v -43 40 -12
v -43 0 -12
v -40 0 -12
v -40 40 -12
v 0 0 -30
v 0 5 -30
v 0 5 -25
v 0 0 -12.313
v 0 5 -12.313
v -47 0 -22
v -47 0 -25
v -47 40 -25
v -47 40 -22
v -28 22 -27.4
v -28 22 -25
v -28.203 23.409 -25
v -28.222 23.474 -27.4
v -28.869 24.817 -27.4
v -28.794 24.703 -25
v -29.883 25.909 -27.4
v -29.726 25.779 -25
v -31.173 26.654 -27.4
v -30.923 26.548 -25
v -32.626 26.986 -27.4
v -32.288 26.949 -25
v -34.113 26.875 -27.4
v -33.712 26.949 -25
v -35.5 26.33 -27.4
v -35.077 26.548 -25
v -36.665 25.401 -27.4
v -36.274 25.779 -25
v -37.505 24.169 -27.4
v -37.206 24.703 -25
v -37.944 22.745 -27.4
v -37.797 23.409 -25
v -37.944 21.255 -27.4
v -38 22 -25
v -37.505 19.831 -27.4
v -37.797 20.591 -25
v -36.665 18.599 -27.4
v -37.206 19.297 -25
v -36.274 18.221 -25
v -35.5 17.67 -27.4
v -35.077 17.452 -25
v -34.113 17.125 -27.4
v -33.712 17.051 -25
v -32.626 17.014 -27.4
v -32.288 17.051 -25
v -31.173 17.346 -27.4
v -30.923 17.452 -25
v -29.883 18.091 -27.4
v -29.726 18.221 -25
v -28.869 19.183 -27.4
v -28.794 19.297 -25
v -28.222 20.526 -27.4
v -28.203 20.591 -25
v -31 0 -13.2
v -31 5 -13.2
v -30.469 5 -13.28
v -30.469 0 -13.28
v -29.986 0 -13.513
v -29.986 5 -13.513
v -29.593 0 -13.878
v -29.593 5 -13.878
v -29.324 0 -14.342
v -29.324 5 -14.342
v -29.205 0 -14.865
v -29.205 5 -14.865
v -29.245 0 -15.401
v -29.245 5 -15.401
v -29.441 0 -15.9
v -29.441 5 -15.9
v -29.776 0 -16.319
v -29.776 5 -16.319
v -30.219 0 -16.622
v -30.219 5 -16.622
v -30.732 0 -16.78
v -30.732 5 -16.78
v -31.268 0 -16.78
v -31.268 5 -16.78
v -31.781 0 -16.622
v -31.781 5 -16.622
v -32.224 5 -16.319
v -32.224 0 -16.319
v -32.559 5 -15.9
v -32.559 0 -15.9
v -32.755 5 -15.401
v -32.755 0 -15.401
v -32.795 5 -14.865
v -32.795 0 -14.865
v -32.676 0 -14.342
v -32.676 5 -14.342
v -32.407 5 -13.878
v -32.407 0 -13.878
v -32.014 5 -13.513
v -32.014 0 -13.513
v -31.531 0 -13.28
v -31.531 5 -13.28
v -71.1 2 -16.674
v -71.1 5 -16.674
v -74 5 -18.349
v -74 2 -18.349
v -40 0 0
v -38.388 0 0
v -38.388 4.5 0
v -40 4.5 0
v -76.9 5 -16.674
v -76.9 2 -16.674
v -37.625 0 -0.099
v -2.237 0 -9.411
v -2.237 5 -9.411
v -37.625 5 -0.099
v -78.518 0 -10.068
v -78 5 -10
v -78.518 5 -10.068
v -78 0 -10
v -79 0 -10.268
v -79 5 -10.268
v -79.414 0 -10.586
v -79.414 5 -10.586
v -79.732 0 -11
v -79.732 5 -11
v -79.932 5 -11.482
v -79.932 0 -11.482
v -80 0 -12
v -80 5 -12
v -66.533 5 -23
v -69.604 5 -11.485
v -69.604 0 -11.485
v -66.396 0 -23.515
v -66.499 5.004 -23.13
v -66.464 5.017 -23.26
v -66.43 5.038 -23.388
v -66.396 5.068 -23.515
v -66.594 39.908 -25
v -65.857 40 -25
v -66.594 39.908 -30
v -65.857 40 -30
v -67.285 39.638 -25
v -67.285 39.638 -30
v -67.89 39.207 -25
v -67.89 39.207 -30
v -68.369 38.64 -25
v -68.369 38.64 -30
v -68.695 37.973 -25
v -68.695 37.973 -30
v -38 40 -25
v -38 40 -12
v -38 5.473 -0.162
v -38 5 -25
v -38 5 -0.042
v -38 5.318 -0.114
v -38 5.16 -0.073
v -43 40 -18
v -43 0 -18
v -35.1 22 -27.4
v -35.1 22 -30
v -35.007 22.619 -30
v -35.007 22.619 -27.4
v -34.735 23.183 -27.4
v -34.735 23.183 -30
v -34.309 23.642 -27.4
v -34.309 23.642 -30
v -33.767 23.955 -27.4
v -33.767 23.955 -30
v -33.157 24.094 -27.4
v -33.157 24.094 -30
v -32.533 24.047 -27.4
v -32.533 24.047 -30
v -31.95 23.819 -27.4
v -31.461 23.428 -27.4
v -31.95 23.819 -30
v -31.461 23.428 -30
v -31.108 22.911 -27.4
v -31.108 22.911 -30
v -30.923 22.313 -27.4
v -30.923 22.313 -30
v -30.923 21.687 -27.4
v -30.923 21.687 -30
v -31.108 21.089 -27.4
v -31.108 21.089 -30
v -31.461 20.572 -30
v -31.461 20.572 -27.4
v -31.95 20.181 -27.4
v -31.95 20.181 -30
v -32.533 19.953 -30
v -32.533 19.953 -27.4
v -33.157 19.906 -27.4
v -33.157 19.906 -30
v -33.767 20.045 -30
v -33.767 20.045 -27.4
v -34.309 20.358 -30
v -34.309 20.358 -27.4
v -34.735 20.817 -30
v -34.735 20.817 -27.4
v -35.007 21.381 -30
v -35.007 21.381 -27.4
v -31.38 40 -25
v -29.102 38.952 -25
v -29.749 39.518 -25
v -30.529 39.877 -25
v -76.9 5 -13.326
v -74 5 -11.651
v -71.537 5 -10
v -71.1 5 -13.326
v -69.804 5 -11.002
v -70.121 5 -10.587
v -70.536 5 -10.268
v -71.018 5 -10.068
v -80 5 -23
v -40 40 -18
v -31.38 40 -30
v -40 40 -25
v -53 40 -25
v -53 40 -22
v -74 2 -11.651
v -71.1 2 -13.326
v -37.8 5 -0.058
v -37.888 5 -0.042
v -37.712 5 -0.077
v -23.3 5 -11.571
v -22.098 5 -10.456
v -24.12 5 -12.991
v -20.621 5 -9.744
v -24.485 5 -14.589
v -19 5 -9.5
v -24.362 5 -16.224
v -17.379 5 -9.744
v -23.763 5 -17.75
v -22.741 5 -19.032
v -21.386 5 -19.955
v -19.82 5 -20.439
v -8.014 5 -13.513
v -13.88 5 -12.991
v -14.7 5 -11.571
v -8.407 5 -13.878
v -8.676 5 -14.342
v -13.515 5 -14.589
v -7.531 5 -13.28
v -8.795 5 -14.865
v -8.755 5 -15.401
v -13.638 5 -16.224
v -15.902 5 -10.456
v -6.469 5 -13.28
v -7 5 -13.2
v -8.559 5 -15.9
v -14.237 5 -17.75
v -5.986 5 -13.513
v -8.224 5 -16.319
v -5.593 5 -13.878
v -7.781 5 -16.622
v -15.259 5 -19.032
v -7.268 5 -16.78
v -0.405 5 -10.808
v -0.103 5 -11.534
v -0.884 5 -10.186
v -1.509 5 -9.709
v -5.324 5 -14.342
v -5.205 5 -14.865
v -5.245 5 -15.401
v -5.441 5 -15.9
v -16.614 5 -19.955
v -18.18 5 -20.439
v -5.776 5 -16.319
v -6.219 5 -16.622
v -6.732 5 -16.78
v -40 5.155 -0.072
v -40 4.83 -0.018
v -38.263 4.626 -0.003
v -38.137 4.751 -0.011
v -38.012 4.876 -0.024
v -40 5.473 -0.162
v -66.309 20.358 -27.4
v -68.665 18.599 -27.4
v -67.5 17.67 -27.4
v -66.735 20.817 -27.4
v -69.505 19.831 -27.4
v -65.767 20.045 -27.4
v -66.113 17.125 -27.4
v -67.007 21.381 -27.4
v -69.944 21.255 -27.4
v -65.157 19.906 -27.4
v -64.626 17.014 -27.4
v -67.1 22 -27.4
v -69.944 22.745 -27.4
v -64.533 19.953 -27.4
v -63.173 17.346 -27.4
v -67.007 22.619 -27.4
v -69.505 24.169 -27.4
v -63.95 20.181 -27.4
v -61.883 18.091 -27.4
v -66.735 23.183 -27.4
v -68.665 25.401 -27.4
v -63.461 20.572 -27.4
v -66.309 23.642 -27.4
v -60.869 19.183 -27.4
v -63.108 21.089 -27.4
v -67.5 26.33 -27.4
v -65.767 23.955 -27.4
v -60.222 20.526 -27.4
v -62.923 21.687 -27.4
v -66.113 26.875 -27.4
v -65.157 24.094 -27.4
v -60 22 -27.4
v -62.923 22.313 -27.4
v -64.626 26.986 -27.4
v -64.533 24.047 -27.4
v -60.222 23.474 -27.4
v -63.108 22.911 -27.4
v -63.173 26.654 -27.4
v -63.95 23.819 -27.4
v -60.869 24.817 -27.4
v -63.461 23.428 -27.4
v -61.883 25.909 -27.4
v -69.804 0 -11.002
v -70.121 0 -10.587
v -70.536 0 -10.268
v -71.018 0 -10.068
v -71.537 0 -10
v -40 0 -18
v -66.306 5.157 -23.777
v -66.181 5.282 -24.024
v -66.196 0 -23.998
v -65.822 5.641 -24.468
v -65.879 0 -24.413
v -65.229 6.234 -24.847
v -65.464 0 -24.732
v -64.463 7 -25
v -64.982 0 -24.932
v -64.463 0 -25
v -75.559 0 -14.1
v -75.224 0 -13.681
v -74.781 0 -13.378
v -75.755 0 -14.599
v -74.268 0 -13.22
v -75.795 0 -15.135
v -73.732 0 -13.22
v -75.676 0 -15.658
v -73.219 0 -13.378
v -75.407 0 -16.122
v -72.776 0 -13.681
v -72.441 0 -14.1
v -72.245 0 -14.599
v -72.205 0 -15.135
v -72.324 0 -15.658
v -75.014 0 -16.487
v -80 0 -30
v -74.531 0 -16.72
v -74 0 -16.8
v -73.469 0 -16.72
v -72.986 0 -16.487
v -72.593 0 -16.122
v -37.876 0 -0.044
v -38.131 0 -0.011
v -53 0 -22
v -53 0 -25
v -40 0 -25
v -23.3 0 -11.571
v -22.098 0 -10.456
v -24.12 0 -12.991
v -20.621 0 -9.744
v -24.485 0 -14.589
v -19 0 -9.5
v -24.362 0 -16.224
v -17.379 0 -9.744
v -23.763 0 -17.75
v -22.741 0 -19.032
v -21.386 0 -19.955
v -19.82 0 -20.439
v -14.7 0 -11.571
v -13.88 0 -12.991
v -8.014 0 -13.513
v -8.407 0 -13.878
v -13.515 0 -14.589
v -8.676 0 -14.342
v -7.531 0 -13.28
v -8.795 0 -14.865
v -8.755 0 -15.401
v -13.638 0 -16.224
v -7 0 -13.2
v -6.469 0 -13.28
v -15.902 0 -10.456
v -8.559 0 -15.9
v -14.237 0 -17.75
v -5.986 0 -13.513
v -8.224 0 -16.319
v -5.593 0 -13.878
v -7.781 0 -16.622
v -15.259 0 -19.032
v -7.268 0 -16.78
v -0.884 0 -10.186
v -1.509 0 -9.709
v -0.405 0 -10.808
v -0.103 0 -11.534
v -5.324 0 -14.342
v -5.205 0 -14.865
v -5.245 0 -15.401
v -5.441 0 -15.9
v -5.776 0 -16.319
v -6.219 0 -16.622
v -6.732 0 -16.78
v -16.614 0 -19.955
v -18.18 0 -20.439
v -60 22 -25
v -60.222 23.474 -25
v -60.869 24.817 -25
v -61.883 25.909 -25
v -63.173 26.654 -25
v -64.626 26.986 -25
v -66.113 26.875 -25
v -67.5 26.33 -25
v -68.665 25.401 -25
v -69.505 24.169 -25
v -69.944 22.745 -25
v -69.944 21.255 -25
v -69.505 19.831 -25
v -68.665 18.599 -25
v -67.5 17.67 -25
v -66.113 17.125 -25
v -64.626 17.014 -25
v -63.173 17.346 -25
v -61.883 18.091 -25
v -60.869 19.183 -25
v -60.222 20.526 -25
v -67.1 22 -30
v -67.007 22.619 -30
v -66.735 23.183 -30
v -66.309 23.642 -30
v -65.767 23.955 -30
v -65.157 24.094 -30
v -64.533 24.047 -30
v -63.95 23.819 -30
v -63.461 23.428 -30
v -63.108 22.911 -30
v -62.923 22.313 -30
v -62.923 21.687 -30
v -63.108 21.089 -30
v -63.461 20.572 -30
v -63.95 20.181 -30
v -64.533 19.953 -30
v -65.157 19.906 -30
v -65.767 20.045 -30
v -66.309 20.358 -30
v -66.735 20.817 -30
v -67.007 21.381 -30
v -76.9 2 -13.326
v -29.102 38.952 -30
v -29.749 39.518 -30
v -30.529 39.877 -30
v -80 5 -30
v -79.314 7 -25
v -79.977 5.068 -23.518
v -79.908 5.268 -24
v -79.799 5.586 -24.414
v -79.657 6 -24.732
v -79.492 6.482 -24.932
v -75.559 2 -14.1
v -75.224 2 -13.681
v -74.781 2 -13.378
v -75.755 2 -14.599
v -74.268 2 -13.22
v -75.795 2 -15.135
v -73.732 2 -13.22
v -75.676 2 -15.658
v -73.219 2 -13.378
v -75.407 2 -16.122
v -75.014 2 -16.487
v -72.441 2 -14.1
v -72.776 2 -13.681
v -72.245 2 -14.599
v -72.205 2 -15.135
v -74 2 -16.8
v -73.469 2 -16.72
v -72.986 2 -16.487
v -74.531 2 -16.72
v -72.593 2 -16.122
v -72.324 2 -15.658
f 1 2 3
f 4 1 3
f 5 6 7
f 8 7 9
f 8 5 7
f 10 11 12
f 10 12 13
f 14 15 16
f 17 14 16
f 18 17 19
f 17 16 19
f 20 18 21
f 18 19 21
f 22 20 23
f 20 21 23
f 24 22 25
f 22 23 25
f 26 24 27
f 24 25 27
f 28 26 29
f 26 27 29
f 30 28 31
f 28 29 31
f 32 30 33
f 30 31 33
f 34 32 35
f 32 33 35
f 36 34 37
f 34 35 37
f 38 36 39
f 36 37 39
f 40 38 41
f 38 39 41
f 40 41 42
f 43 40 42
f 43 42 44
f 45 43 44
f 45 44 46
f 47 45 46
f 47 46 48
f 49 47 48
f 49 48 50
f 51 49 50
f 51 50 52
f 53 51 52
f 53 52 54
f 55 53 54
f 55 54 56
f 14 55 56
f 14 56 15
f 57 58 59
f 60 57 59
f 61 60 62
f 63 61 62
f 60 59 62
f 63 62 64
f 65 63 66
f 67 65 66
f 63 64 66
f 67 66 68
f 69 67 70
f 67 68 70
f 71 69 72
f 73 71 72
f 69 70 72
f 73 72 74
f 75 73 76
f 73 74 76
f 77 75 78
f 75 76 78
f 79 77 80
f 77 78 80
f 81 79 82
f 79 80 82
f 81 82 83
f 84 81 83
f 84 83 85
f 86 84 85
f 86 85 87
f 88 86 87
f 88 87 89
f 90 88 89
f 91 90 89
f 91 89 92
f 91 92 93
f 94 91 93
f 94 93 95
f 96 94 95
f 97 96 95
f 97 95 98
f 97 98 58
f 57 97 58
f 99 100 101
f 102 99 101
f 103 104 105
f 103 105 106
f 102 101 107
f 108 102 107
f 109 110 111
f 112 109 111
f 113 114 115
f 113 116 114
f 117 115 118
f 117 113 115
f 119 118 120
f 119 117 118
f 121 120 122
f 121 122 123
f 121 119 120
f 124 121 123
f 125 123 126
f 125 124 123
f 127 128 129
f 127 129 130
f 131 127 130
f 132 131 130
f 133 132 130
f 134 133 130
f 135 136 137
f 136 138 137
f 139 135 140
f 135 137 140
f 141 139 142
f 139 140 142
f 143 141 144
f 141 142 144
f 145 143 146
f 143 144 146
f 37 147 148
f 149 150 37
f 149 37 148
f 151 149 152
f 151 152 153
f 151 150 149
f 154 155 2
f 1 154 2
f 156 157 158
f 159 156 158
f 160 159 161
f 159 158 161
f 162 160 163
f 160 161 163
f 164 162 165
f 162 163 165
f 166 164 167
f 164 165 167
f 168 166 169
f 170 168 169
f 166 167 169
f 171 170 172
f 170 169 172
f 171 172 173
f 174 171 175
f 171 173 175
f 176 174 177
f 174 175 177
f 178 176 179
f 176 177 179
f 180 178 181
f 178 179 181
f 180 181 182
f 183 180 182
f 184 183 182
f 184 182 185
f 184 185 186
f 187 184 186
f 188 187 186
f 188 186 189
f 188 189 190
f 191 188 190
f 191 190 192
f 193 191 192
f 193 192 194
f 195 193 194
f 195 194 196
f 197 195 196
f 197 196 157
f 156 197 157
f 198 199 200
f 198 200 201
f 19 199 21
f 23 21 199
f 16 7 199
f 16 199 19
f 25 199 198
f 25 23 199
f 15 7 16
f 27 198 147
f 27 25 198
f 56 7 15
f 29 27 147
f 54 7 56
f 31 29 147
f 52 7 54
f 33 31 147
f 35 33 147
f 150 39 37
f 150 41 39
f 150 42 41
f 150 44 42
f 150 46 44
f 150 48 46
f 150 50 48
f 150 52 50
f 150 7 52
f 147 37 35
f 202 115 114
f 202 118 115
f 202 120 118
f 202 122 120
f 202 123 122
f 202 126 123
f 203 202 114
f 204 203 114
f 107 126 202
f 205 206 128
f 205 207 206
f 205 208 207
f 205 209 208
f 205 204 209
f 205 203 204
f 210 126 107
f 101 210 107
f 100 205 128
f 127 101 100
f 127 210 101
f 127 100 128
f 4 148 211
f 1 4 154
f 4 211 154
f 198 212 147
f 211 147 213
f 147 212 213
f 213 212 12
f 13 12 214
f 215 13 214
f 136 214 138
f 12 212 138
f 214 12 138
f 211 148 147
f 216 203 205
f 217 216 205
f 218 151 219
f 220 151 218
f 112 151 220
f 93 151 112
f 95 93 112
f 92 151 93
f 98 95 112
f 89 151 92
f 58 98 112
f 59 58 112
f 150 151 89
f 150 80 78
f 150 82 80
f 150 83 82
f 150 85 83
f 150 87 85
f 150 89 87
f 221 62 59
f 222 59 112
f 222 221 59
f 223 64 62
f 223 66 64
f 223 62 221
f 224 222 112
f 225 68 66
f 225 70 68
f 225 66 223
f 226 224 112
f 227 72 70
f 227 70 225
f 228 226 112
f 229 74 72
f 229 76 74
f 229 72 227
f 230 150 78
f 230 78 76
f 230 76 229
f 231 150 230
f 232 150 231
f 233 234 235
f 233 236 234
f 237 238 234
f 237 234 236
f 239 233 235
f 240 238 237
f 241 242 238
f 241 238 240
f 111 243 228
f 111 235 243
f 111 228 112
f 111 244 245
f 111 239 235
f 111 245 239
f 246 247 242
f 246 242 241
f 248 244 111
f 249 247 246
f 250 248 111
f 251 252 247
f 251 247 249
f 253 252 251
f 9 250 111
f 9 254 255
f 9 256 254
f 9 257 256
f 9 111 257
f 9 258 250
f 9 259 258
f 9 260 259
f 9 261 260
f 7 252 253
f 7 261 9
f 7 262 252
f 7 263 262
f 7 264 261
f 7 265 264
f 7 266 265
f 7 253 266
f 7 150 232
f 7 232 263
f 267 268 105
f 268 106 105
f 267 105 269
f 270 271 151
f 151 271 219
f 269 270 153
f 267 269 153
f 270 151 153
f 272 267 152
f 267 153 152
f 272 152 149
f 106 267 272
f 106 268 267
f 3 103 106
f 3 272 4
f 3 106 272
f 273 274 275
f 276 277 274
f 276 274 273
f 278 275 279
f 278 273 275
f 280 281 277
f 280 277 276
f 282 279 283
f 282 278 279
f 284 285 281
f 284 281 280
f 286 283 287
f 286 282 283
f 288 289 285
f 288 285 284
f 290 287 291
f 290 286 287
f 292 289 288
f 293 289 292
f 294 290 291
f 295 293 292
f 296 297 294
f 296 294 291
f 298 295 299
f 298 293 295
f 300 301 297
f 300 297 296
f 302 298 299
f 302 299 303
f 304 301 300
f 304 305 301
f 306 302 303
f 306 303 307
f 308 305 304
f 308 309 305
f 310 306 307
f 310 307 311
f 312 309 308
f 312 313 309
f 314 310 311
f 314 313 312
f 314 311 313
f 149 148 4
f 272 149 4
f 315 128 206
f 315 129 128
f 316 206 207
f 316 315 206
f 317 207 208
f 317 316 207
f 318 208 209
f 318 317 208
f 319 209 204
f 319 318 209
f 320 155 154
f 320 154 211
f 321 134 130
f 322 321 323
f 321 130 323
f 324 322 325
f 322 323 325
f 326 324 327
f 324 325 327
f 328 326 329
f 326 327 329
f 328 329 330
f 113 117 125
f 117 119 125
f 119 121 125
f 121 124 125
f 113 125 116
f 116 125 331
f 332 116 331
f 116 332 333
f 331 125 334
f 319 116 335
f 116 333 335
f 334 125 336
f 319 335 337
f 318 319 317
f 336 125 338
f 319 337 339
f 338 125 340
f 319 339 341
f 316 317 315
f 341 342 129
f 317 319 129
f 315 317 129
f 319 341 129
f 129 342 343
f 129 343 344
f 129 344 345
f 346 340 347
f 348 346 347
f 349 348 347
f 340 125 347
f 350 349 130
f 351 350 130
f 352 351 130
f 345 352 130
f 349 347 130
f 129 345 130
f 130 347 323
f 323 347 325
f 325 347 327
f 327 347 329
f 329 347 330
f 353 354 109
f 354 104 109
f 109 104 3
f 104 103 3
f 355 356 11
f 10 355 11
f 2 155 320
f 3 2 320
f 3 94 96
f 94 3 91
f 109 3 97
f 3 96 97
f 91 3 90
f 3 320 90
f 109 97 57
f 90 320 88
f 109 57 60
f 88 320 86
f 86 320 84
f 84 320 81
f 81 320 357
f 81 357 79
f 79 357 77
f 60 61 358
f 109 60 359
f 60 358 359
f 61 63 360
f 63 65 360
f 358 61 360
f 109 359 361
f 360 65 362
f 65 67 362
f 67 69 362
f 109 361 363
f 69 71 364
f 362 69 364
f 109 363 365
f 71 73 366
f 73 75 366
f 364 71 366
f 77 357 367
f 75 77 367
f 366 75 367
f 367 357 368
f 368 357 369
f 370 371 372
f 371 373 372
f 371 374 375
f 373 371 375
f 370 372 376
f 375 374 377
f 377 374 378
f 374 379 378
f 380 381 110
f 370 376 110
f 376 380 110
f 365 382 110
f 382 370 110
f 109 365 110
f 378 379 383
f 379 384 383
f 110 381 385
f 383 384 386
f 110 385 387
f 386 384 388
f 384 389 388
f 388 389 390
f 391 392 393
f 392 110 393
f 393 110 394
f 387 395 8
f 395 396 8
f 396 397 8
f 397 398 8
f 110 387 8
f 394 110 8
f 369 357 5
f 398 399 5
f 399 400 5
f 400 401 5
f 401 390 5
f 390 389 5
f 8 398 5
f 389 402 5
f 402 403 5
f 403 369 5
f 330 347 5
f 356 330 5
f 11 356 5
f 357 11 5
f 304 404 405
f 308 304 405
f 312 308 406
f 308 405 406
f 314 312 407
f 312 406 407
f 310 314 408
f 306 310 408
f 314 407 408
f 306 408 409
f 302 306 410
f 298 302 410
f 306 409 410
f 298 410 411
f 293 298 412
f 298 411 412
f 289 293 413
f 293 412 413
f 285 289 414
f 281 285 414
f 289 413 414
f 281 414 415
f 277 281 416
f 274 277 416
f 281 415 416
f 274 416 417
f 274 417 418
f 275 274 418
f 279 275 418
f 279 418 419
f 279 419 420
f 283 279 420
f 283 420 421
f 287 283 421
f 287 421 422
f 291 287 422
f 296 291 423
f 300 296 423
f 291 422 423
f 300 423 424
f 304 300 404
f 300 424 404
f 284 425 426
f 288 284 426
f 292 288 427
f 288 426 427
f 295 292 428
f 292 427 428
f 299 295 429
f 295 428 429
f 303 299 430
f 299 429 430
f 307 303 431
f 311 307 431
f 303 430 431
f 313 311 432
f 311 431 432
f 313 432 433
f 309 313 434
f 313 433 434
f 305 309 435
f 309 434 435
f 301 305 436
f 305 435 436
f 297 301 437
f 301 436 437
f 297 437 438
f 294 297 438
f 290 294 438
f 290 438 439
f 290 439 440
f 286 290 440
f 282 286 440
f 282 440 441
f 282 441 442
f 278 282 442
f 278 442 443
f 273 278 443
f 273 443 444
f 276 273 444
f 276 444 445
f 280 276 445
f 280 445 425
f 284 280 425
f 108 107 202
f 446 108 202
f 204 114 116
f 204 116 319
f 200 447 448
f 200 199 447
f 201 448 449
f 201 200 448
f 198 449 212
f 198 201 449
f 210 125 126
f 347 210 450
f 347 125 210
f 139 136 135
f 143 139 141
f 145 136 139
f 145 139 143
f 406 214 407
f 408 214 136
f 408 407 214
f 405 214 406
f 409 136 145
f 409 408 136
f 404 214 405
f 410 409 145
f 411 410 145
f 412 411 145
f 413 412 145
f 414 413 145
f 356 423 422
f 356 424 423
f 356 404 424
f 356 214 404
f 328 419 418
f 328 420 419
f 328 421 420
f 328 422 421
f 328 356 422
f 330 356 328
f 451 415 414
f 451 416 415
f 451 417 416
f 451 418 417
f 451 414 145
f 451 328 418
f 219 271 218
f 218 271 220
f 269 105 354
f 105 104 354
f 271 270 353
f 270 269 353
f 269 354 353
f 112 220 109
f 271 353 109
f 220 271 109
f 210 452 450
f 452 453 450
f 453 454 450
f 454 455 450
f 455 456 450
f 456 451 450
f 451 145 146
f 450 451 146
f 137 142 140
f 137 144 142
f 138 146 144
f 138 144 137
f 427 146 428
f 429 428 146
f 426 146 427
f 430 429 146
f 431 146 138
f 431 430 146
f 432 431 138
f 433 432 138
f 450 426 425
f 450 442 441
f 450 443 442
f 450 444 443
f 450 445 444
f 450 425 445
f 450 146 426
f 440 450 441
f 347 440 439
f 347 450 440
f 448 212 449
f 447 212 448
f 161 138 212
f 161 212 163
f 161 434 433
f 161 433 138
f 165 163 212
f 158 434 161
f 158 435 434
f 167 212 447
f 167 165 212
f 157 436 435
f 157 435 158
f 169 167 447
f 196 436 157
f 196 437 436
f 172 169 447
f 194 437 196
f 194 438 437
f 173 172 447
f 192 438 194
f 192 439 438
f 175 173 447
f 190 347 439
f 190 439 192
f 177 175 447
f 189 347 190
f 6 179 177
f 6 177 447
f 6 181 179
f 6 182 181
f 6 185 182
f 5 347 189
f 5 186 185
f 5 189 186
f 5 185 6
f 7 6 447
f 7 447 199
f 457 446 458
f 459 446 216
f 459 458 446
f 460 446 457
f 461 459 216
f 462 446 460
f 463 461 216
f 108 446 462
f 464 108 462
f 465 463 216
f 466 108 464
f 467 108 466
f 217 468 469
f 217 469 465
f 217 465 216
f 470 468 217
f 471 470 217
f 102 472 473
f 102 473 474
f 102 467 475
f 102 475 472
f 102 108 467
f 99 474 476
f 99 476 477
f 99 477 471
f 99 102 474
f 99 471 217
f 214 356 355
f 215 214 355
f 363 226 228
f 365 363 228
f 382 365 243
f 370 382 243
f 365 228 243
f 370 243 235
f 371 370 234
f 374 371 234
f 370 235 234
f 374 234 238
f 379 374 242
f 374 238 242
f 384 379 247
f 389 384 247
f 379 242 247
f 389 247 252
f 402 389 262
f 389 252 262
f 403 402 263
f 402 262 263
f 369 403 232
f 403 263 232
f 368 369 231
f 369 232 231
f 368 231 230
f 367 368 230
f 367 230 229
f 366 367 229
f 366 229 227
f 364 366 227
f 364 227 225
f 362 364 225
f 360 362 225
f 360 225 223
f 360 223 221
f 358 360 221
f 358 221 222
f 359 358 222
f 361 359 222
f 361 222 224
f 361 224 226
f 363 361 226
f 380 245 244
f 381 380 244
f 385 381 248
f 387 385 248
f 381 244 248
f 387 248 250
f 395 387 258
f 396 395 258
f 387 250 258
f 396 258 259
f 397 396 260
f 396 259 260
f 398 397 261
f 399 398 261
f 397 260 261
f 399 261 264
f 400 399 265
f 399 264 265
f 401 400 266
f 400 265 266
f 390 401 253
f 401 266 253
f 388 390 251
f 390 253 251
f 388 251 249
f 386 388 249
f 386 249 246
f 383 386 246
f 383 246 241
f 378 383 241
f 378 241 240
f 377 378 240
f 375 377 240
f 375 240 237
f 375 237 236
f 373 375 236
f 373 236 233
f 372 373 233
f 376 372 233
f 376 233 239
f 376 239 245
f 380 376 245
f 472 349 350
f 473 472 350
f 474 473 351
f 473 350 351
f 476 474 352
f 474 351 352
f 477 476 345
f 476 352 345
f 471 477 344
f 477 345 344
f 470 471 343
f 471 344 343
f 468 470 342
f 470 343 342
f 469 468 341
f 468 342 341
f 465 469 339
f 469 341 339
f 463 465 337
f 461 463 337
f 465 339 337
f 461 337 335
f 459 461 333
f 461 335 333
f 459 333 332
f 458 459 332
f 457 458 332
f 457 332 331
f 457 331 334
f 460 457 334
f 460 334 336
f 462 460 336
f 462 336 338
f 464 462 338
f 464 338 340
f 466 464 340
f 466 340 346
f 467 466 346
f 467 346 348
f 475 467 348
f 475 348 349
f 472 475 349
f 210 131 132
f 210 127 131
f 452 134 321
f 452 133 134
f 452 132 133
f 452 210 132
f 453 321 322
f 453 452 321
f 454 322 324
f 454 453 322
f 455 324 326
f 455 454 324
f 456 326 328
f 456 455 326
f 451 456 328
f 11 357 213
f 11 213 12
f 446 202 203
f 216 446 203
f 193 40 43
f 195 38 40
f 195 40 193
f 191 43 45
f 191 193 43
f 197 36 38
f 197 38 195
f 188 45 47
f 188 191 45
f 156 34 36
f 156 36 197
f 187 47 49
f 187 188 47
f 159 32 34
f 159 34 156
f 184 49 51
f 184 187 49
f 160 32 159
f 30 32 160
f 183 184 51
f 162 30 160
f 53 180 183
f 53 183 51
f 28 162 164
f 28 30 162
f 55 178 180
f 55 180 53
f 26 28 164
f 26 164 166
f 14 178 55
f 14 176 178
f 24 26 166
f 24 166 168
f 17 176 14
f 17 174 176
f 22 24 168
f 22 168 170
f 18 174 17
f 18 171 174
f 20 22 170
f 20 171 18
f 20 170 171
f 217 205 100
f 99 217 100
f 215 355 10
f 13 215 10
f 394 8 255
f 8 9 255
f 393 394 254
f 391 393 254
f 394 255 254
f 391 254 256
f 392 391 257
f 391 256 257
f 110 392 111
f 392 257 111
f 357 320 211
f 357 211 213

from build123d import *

# Parameters (mm, degrees)
SKETCH1_W           = 80
SKETCH1_H           = 30
BOSS_EXTRUDE1_DEPTH = 5
SKETCH2_W           = 20
SKETCH2_H           = 25
CUT_EXTRUDE1_DEPTH  = 86.586213843
BOSS_EXTRUDE2_DEPTH = 35
SKETCH4_R           = 5.5
SKETCH4_R_2         = 1.8
CUT_EXTRUDE2_DEPTH  = 93.330926563
CHAMFER1_SIZE       = 38
CHAMFER1_SIZE2      = 10
FILLET1_R           = 3
SKETCH5_R           = 2.1
CUT_EXTRUDE3_DEPTH  = 95.339811321
SKETCH6_R           = 5
CUT_EXTRUDE4_DEPTH  = 2.4
CHAMFER2_SIZE       = 35
CHAMFER2_SIZE2      = 30
FILLET2_R           = 3
SKETCH7_W           = 6
SKETCH7_H           = 3
SKETCH7_W_2         = 3
SKETCH7_H_2         = 6
BOSS_EXTRUDE3_DEPTH = 40
CHAMFER3_SIZE       = 35
CHAMFER3_SIZE2      = 12
FILLET3_R           = 3
CHAMFER4_SIZE       = 35
CHAMFER4_SIZE2      = 12
FILLET4_R           = 3
SKETCH8_R           = 1.8
CUT_EXTRUDE5_DEPTH  = 95.339811321
CUT_EXTRUDE6_DEPTH  = 93.330926563
FILLET5_R           = 2
CUT_EXTRUDE7_DEPTH  = 3


with BuildPart() as part:
    # Sketch1 → Boss-Extrude1 (new body)
    with BuildSketch(Plane(origin=(0, 0, 0), x_dir=(1, 0, 0), z_dir=(0, 1, 0))):
        with Locations((-40, 15)):
            Rectangle(SKETCH1_W, SKETCH1_H)
    extrude(amount=BOSS_EXTRUDE1_DEPTH)

    # Sketch2 → Cut-Extrude1 (cut, through all)
    with BuildSketch(Plane(origin=(0, 5, 0), x_dir=(1, 0, 0), z_dir=(0, 1, 0))):
        with Locations((-50, 12.5)):
            Rectangle(SKETCH2_W, SKETCH2_H)
    extrude(amount=-CUT_EXTRUDE1_DEPTH, mode=Mode.SUBTRACT)

    # Sketch3 → Boss-Extrude2 (add)
    with BuildSketch(Plane(origin=(0, 5, 0), x_dir=(1, 0, 0), z_dir=(0, 1, 0))):
        Polygon((-80, 30), (0, 30), (0, 25), (-38, 25), (-38, 0), (-40, 0), (-40, 25), (-80, 25), align=None)
    extrude(amount=BOSS_EXTRUDE2_DEPTH)

    # Sketch4 → Cut-Extrude2 (cut, through all)
    with BuildSketch(Plane(origin=(0, 5, 0), x_dir=(1, 0, 0), z_dir=(0, 1, 0))):
        with Locations(Location((-19, 15, 0), (0, 0, 270))):
            Circle(SKETCH4_R)
        with Locations(Location((-7, 15, 0), (0, 0, 270))):
            Circle(SKETCH4_R_2)
        with Locations(Location((-31, 15, 0), (0, 0, 270))):
            Circle(SKETCH4_R_2)
    extrude(amount=-CUT_EXTRUDE2_DEPTH, mode=Mode.SUBTRACT)

    # Chamfer1
    chamfer1_edges = [part.edges().sort_by_distance(p)[0] for p in [
        (0, 2.5, 0),
    ]]
    chamfer1_side = [part.faces().sort_by_distance(p)[0] for p in [
        (-20, 0.565685425, 0),
    ]]
    chamfer(chamfer1_edges, length=CHAMFER1_SIZE, length2=CHAMFER1_SIZE2, reference=chamfer1_side[0])

    # Fillet1
    fillet1_edges = [part.edges().sort_by_distance(p)[0] for p in [
        (0, 2.5, -10),
    ]]
    fillet(fillet1_edges, radius=FILLET1_R)

    # Sketch5 → Cut-Extrude3 (cut, through all)
    with BuildSketch(Plane(origin=(0, 0, -30), x_dir=(-1, 0, 0), z_dir=(0, 0, -1))):
        with Locations((33, 22)):
            Circle(SKETCH5_R)
        with Locations((65, 22)):
            Circle(SKETCH5_R)
    extrude(amount=-CUT_EXTRUDE3_DEPTH, mode=Mode.SUBTRACT)

    # Sketch6 → Cut-Extrude4 (cut)
    with BuildSketch(Plane.XY.offset(-25)):
        with Locations((-33, 22)):
            Circle(SKETCH6_R)
        with Locations((-65, 22)):
            Circle(SKETCH6_R)
    extrude(amount=-CUT_EXTRUDE4_DEPTH, mode=Mode.SUBTRACT)

    # Chamfer2
    chamfer2_edges = [part.edges().sort_by_distance(p)[0] for p in [
        (0, 40, -27.5),
    ]]
    chamfer2_side = [part.faces().sort_by_distance(p)[0] for p in [
        (0, 15.78592553, -25.370407315),
    ]]
    chamfer(chamfer2_edges, length=CHAMFER2_SIZE, length2=CHAMFER2_SIZE2, reference=chamfer2_side[0])

    # Fillet2
    fillet2_edges = [part.edges().sort_by_distance(p)[0] for p in [
        (-30, 40, -27.5),
    ]]
    fillet(fillet2_edges, radius=FILLET2_R)

    # Sketch7 → Boss-Extrude3 (add)
    with BuildSketch(Plane.XZ):
        with Locations((-50, -23.5)):
            Rectangle(SKETCH7_W, SKETCH7_H)
        with Locations((-41.5, -15)):
            Rectangle(SKETCH7_W_2, SKETCH7_H_2)
    extrude(amount=-BOSS_EXTRUDE3_DEPTH)

    # Chamfer3
    chamfer3_edges = [part.edges().sort_by_distance(p)[0] for p in [
        (-39, 40, 0),
    ]]
    chamfer3_side = [part.faces().sort_by_distance(p)[0] for p in [
        (-39, 20, 0),
    ]]
    chamfer(chamfer3_edges, length=CHAMFER3_SIZE, length2=CHAMFER3_SIZE2, reference=chamfer3_side[0])

    # Fillet3
    # the kernel refuses this fillet: 3 mm, written as the material it takes off along each edge
    with BuildSketch(Plane(origin=(-36.75, 5, 0), x_dir=(0, 0.945945945945946, -0.3243243243243238), z_dir=(-1, 0, 0))) as fillet3_piece_1:
        with BuildLine():
            CenterArc((FILLET3_R * 0.166666666667, FILLET3_R), FILLET3_R, 251.075355584, 18.924644416)
            Line((-FILLET3_R * 0.157657657658, FILLET3_R * 0.0540540540541), (0, 0))
            Line((0, 0), (FILLET3_R * 0.166666666667, 0))
        make_face()
    extrude(amount=4.5, mode=Mode.SUBTRACT)
    with BuildSketch(Plane(origin=(-38, -0.970324057, 0), x_dir=(-1, 0, 0), z_dir=(0, 1, 0))) as fillet3_piece_2:
        with BuildLine():
            CenterArc((FILLET3_R * 0.129376540878, -FILLET3_R), FILLET3_R, 90, 14.743562836)
            Line((-FILLET3_R * 0.125116758402, -FILLET3_R * 0.0329254627374), (0, 0))
            Line((0, 0), (FILLET3_R * 0.129376540878, 0))
        make_face()
    extrude(amount=6.940648113, mode=Mode.SUBTRACT)

    # Chamfer4
    chamfer4_edges = [part.edges().sort_by_distance(p)[0] for p in [
        (-80, 40, -27.5),
    ]]
    chamfer4_side = [part.faces().sort_by_distance(p)[0] for p in [
        (-80, 2.5, -0.5),
    ]]
    chamfer(chamfer4_edges, length=CHAMFER4_SIZE, length2=CHAMFER4_SIZE2, reference=chamfer4_side[0])

    # Fillet4
    fillet4_edges = [part.edges().sort_by_distance(p)[0] for p in [
        (-68, 40, -27.5),
    ]]
    fillet(fillet4_edges, radius=FILLET4_R)

    # Sketch8 → Cut-Extrude5 (cut, through all)
    with BuildSketch(Plane.XZ):
        with Locations(Location((-74, -15, 0), (0, 0, 270))):
            Circle(SKETCH8_R)
    extrude(amount=-CUT_EXTRUDE5_DEPTH, mode=Mode.SUBTRACT)

    # Sketch9 → Cut-Extrude6 (cut, through all)
    with BuildSketch(Plane(origin=(0, 5, 0), x_dir=(1, 0, 0), z_dir=(0, 1, 0))):
        Polygon((-80, 10), (-70, 10), (-66, 25), (-60, 25), (-60, 0), (-80, 0), align=None)
    extrude(amount=-CUT_EXTRUDE6_DEPTH, mode=Mode.SUBTRACT)

    # Fillet5
    fillet5_edges = [part.edges().sort_by_distance(p)[0] for p in [
        (-80, 2.5, -10),
        (-70, 2.5, -10),
        (-66, 2.5, -25),
        (-73, 5, -25),
    ]]
    fillet(fillet5_edges, radius=FILLET5_R)

    # Sketch10 → Cut-Extrude7 (cut)
    with BuildSketch(Plane(origin=(0, 5, 0), x_dir=(1, 0, 0), z_dir=(0, 1, 0))):
        Polygon((-71.1, 13.325684219), (-71.1, 16.674315781), (-74, 18.348631561), (-76.9, 16.674315781), (-76.9, 13.325684219), (-74, 11.651368439), align=None)
    extrude(amount=-CUT_EXTRUDE7_DEPTH, mode=Mode.SUBTRACT)


solid = part.part
